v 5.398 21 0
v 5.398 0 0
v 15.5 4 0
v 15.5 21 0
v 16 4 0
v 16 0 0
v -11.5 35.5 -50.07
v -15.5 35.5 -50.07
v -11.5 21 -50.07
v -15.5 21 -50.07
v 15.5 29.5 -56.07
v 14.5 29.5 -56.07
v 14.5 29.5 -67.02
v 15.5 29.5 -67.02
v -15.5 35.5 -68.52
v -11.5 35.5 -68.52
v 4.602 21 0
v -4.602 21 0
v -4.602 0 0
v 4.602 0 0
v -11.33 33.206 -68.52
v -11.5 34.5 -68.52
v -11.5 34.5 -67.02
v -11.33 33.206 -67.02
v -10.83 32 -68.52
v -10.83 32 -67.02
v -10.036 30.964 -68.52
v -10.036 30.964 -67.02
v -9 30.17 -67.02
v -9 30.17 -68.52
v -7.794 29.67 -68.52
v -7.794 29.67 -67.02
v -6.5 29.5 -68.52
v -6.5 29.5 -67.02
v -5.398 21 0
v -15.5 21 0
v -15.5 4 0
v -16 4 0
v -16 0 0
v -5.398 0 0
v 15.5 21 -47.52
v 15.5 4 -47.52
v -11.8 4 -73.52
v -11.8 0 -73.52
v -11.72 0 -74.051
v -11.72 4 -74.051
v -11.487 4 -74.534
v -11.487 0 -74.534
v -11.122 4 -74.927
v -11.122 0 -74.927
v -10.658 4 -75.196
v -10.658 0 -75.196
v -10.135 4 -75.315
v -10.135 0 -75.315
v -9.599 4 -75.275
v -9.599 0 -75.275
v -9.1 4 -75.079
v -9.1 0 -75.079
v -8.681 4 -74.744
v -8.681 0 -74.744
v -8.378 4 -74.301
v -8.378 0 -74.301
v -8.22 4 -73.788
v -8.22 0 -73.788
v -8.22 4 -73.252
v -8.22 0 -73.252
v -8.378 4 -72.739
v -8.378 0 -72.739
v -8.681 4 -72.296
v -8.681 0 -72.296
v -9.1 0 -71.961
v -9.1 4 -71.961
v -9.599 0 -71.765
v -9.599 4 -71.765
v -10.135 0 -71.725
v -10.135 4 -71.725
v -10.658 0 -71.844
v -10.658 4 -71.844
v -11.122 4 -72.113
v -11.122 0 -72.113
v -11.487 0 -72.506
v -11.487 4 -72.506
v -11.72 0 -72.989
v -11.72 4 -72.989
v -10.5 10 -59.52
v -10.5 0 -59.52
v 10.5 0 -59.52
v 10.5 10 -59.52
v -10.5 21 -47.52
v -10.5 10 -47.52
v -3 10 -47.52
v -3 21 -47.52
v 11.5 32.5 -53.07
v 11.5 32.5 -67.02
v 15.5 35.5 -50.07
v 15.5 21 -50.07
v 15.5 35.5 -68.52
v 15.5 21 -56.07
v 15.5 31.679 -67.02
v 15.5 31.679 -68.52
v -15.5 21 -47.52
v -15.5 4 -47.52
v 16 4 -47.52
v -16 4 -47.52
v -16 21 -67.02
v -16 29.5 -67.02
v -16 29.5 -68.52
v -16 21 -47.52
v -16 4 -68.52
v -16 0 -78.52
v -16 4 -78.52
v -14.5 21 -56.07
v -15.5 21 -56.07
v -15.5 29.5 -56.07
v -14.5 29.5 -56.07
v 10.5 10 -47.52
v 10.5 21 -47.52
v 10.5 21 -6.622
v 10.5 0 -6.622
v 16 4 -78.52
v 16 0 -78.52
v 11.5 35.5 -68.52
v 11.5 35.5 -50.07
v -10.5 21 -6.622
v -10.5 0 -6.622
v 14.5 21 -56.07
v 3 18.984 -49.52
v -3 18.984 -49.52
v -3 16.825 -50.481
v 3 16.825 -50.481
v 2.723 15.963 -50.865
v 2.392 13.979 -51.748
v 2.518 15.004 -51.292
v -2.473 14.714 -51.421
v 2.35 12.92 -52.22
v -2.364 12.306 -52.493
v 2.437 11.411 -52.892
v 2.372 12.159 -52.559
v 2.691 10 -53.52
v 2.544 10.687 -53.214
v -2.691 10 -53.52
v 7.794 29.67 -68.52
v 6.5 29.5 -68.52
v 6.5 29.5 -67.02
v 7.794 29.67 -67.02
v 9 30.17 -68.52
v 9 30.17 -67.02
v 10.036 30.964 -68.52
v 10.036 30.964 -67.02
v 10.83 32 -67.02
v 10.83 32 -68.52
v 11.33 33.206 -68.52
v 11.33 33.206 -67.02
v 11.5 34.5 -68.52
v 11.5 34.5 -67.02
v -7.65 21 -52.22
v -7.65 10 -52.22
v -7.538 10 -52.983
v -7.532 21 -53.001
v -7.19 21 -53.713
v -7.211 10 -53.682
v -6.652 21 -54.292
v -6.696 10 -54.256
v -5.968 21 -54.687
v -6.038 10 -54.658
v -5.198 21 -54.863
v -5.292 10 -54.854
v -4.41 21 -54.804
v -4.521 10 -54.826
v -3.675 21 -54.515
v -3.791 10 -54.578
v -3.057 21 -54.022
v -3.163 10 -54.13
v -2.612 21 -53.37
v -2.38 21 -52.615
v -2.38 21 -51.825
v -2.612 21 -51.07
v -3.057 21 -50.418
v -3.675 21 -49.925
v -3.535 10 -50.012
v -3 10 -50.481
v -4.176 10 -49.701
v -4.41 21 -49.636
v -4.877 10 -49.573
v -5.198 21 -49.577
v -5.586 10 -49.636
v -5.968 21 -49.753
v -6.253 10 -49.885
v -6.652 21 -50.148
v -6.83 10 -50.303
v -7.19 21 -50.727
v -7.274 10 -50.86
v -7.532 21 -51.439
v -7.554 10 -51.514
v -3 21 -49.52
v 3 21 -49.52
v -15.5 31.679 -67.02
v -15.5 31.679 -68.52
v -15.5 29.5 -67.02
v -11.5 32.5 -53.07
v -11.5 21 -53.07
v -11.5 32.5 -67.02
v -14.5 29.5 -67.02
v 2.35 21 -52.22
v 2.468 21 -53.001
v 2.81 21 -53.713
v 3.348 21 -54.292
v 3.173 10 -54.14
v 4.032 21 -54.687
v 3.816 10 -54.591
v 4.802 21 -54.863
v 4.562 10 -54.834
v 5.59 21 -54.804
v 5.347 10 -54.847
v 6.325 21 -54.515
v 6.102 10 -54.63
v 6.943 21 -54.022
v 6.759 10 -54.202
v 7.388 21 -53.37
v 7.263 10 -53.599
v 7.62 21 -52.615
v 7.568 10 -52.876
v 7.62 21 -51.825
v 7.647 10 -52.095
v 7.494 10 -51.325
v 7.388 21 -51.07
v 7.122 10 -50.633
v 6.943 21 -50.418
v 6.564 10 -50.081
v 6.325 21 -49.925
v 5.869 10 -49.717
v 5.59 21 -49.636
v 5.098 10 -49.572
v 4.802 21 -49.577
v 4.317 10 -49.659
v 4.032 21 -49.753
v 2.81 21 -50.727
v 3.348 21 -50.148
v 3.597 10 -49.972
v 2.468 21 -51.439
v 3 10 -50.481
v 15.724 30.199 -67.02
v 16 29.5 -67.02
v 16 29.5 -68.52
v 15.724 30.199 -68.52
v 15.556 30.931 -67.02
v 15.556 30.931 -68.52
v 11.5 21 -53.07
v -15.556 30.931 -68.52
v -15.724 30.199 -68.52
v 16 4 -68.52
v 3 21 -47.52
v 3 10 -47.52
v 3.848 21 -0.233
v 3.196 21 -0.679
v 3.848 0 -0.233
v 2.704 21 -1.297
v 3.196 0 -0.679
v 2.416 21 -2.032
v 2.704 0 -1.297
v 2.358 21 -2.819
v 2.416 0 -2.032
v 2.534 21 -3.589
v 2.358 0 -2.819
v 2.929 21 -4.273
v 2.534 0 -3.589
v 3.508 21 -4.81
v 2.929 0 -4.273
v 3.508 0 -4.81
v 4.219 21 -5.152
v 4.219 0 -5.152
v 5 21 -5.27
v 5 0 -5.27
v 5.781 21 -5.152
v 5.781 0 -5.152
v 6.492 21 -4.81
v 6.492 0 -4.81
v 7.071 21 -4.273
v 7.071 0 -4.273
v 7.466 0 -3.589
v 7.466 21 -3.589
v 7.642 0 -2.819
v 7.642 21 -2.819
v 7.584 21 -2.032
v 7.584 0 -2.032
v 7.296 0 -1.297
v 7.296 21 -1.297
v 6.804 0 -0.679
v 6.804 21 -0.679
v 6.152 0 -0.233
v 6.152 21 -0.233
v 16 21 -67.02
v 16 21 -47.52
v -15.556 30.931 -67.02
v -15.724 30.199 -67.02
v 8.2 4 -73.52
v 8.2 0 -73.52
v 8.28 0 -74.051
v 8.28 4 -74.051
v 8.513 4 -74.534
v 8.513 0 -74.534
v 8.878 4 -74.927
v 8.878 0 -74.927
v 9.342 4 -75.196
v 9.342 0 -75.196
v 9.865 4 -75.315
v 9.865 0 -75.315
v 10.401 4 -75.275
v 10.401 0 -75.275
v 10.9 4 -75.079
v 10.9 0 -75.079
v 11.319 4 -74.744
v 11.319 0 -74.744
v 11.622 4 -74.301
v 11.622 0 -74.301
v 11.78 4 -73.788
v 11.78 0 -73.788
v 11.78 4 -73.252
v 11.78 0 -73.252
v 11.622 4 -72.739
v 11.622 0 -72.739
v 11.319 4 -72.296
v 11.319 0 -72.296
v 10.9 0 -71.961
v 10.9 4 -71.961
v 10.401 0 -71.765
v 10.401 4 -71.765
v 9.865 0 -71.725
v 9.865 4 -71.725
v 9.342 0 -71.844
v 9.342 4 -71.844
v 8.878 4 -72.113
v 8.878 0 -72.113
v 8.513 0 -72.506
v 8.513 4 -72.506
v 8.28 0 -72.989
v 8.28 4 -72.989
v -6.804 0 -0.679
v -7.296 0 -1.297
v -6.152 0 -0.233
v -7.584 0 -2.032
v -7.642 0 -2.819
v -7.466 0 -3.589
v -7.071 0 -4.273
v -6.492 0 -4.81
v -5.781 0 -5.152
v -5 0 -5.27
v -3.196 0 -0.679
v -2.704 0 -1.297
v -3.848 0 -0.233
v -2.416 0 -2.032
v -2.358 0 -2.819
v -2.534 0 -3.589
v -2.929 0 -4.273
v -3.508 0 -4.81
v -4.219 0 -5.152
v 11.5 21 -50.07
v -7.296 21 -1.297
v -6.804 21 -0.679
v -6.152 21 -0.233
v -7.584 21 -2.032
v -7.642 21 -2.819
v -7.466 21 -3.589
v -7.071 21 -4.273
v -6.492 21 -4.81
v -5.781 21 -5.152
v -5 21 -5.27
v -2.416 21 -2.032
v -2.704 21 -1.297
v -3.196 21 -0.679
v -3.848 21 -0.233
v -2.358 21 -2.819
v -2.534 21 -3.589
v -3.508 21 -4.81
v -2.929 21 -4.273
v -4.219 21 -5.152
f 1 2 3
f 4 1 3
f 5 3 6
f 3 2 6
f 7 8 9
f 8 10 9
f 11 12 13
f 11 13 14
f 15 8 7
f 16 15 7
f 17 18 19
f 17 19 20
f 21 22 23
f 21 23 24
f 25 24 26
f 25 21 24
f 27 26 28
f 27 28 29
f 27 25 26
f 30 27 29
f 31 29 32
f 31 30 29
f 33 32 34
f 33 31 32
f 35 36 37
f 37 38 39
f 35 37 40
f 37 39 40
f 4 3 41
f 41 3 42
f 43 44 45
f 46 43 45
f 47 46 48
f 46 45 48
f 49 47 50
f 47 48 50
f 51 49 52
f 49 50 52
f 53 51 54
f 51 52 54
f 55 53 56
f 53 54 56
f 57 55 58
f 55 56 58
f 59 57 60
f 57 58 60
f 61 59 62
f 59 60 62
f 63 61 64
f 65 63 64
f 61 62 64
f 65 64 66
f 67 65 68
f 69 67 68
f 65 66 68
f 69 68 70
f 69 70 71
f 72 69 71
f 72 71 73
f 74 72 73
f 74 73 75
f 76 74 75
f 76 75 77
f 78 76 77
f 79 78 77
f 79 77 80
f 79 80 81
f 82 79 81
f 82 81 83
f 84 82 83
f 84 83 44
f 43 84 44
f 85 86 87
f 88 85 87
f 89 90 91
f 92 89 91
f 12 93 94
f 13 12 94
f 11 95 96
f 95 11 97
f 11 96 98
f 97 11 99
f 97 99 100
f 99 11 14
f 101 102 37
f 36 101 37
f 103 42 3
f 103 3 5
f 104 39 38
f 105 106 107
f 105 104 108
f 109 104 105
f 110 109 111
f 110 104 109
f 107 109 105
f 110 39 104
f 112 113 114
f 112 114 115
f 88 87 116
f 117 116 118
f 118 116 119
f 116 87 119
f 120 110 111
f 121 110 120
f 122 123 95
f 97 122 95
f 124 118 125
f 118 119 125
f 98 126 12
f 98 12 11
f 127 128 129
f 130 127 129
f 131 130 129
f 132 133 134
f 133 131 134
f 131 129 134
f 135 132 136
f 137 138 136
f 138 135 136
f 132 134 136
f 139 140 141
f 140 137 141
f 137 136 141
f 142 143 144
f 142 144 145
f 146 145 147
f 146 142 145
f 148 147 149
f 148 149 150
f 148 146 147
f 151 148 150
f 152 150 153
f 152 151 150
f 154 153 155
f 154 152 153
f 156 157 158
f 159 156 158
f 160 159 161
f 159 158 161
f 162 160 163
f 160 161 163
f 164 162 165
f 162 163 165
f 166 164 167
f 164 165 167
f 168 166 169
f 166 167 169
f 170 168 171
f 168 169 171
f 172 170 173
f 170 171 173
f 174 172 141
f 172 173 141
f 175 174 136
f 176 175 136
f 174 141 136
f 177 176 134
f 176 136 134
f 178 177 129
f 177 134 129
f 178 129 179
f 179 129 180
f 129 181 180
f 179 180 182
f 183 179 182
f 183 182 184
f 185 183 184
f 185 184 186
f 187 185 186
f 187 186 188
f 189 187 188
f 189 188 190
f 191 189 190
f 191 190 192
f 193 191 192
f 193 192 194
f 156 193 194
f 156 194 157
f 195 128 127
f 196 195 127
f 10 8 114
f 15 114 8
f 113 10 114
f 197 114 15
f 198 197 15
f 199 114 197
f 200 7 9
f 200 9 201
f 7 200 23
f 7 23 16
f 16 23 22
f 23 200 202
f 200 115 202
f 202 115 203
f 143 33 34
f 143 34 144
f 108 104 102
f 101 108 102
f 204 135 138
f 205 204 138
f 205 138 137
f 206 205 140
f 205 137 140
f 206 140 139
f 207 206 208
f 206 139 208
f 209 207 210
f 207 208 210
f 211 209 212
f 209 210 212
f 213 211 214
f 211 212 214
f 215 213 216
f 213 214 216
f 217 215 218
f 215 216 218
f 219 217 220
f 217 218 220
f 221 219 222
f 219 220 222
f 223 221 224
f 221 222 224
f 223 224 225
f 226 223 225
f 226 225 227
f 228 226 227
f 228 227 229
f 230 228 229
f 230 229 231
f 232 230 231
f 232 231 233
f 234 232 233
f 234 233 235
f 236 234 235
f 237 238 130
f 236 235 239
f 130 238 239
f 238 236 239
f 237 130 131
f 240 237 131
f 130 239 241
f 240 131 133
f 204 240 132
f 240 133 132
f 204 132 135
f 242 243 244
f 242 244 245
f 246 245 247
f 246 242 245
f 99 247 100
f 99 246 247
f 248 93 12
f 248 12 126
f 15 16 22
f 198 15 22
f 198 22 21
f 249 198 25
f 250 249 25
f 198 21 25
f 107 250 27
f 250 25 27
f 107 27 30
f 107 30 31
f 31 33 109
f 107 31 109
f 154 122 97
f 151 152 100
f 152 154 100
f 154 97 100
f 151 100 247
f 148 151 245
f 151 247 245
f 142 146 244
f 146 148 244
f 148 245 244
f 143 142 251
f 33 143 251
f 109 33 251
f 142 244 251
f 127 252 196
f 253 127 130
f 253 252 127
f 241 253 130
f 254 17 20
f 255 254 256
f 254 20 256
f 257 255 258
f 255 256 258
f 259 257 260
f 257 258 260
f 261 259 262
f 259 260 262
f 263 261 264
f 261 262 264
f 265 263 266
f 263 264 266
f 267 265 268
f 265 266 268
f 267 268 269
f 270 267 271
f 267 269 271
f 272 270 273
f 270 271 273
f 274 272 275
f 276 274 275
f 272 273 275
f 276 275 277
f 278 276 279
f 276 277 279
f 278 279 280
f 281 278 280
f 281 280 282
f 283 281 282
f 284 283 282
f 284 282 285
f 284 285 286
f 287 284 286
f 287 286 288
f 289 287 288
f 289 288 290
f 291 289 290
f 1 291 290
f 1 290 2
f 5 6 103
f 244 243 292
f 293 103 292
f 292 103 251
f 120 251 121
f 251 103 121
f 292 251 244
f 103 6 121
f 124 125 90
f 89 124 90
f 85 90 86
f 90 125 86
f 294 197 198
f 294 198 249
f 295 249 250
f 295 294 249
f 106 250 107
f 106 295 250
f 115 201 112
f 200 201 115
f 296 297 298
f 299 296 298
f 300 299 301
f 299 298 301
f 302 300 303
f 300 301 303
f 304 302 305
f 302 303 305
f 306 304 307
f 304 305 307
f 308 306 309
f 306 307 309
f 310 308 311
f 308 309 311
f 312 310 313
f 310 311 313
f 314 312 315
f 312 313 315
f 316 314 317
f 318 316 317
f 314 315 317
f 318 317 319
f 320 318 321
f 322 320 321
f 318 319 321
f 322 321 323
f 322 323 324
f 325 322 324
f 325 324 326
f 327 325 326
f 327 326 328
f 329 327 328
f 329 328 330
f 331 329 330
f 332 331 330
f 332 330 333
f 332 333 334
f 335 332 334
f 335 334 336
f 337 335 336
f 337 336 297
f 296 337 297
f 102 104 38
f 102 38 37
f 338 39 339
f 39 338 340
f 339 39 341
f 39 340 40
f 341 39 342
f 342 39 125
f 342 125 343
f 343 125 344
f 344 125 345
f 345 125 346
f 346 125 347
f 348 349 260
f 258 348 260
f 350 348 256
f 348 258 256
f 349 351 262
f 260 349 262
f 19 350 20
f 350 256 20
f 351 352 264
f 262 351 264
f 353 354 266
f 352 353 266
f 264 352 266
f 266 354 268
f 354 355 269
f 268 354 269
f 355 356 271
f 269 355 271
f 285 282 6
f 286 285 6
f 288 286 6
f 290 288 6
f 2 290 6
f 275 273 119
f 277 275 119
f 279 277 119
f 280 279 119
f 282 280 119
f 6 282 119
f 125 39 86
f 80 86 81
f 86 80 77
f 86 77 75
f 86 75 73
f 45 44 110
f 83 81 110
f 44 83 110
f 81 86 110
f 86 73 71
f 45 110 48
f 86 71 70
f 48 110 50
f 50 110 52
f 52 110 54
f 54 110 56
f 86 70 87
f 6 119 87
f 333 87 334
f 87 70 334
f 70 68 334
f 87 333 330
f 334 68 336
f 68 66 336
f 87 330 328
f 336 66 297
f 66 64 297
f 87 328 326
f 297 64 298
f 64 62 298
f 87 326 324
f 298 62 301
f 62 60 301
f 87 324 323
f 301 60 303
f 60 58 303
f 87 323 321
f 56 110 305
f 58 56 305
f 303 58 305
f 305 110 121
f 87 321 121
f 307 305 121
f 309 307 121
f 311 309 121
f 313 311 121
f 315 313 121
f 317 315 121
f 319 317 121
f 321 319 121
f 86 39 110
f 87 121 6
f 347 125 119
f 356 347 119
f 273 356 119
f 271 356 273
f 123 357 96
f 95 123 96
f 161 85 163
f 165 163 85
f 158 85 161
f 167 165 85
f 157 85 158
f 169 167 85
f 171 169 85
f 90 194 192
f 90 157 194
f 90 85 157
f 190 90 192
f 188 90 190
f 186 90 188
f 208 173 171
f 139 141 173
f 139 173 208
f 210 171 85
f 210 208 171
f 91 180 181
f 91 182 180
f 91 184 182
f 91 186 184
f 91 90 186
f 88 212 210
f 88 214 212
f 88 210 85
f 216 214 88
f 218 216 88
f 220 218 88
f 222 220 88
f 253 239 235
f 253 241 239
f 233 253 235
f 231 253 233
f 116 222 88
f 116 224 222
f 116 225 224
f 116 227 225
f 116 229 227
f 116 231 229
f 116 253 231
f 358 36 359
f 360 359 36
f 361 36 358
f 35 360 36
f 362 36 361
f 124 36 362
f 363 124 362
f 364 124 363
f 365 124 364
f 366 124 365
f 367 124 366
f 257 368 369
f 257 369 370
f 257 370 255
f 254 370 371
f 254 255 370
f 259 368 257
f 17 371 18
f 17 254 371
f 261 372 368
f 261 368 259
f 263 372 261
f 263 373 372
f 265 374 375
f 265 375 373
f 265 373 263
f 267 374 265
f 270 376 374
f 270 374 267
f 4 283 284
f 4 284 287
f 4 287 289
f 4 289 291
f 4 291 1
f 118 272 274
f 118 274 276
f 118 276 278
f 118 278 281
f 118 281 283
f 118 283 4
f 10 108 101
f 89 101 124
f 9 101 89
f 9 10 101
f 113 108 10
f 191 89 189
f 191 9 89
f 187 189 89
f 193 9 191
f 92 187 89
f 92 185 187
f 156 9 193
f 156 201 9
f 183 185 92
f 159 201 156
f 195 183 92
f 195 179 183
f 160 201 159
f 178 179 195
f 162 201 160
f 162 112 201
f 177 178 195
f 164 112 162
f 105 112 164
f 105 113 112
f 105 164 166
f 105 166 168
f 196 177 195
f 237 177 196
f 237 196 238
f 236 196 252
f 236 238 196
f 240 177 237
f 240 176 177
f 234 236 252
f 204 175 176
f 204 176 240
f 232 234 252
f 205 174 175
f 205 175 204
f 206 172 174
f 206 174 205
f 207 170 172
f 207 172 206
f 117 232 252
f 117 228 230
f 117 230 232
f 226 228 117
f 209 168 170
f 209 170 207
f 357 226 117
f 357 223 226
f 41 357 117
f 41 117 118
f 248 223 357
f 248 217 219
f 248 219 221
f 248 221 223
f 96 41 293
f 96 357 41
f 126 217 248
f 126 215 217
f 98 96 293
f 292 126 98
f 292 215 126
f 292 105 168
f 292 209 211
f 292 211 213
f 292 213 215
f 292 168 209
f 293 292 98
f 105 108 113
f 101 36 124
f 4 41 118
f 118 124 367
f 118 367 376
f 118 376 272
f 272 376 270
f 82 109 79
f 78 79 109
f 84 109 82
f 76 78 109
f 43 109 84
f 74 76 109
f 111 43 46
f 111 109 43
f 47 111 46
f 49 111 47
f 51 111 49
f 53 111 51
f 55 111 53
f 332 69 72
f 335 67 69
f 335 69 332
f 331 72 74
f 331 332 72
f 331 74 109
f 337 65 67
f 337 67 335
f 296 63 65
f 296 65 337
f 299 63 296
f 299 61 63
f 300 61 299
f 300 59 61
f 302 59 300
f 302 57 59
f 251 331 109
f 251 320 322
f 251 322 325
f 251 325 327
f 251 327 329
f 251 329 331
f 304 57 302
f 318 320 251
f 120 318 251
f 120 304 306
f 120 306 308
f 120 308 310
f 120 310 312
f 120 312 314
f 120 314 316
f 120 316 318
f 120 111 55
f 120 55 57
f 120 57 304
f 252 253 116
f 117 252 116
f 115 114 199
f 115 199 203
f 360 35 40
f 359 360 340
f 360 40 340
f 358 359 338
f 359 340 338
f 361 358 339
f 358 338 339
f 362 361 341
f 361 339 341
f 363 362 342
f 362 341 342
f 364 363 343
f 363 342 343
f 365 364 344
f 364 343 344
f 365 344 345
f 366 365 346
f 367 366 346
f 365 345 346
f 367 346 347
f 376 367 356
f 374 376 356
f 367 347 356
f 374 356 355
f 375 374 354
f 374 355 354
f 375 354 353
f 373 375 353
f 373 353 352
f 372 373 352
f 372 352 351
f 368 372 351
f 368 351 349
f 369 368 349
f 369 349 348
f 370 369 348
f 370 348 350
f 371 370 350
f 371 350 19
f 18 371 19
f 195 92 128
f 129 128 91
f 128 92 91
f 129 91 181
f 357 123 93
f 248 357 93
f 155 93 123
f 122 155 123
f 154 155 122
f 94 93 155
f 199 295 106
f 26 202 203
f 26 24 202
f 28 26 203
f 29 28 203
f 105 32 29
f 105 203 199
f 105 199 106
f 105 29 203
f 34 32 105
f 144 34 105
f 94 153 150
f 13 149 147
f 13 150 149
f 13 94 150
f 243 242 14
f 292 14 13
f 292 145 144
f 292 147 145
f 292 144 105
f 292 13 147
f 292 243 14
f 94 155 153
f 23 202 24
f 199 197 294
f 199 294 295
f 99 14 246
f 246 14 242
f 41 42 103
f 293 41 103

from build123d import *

# Parameters (mm, degrees)
SKETCH1_W                  = 32
SKETCH1_H                  = 78.52
BOSS_EXTRUDE1_DEPTH        = 4
M3_CLEARANCE_HOLE1_D       = 3.6
M3_CLEARANCE_HOLE1_DEPTH   = 10
M3_CLEARANCE_HOLE1_TIP     = 1.081549114
BOSS_EXTRUDE2_DEPTH        = 17
BOSS_EXTRUDE3_DEPTH        = 17
SKETCH6_W                  = 32
SKETCH6_H                  = 1.5
SKETCH6_W_2                = 4
SKETCH6_H_2                = 6
BOSS_EXTRUDE4_DEPTH        = 8.5
SKETCH14_W                 = 4
SKETCH14_H                 = 18.45
BOSS_EXTRUDE5_DEPTH        = 6
FILLET1_R                  = 5
CHAMFER1_SIZE              = 3
CHAMFER2_SIZE              = 3
CUT_EXTRUDE1_DEPTH         = 87.102499383
CUT_EXTRUDE1_DEPTH_BACK    = 87.102499383
SKETCH15_W                 = 21
SKETCH15_H                 = 40.897809358
F_5_3_5_3_DIAMETER_HOLE1_D = 5.3
SKETCH19_W                 = 21
SKETCH19_H                 = 12
CUT_EXTRUDE2_DEPTH         = 10
CUT_EXTRUDE3_DEPTH         = 83.839546112
CUT_EXTRUDE3_DEPTH_BACK    = 83.839546112
SKETCH20_W                 = 6
SKETCH20_H                 = 2
CHAMFER3_SIZE              = 8.984147096
CHAMFER3_SIZE_2            = 4


with BuildPart() as part:
    # Sketch1 → Boss-Extrude1 (new body)
    with BuildSketch(Plane(origin=(0, 0, 0), x_dir=(1, 0, 0), z_dir=(0, 1, 0))):
        with Locations((0, 39.26)):
            Rectangle(SKETCH1_W, SKETCH1_H)
    extrude(amount=BOSS_EXTRUDE1_DEPTH)

    # M3 Clearance Hole1
    with Locations(Plane(origin=(0, 4, 0), x_dir=(1, 0, 0), z_dir=(0, 1, 0))):
        with Locations((-10, 73.52), (10, 73.52)):
            Hole(M3_CLEARANCE_HOLE1_D / 2, depth=M3_CLEARANCE_HOLE1_DEPTH)
            with Locations((0, 0, -(M3_CLEARANCE_HOLE1_DEPTH + M3_CLEARANCE_HOLE1_TIP / 2))):  # 118° drill point
                Cone(0, M3_CLEARANCE_HOLE1_D / 2, M3_CLEARANCE_HOLE1_TIP, mode=Mode.SUBTRACT)

    # Sketch5 → Boss-Extrude2 (add)
    with BuildSketch(Plane(origin=(0, 4, 0), x_dir=(1, 0, 0), z_dir=(0, 1, 0))):
        Polygon((16, 68.52), (-16, 68.52), (-16, 47.520000358), (-15.5, 47.520000358), (-10.5, 47.520000358), (10.5, 47.520000358), (15.5, 47.520000358), (16, 47.520000358), align=None)
    extrude(amount=BOSS_EXTRUDE2_DEPTH)

    # Sketch5<4> → Boss-Extrude3 (add)
    with BuildSketch(Plane(origin=(0, 4, 0), x_dir=(1, 0, 0), z_dir=(0, 1, 0))):
        Polygon((-10.5, 47.520000358), (-15.5, 47.520000358), (-15.5, 0), (15.5, 0), (15.5, 47.520000358), (10.5, 47.520000358), (10.5, 6.622191), (-10.5, 6.622191), align=None)
    extrude(amount=BOSS_EXTRUDE3_DEPTH)

    # Sketch6 → Boss-Extrude4 (add)
    with BuildSketch(Plane(origin=(0, 21, 0), x_dir=(1, 0, 0), z_dir=(0, 1, 0))):
        with Locations((0, 67.77)):
            Rectangle(SKETCH6_W, SKETCH6_H)
        with Locations((13.5, 53.07)):
            Rectangle(SKETCH6_W_2, SKETCH6_H_2)
        with Locations((-13.5, 53.07)):
            Rectangle(SKETCH6_W_2, SKETCH6_H_2)
    extrude(amount=BOSS_EXTRUDE4_DEPTH)

    # Sketch14 → Boss-Extrude5 (add)
    with BuildSketch(Plane(origin=(0, 29.5, 0), x_dir=(1, 0, 0), z_dir=(0, 1, 0))):
        with Locations((-13.5, 59.295)):
            Rectangle(SKETCH14_W, SKETCH14_H)
        with Locations((13.5, 59.295)):
            Rectangle(SKETCH14_W, SKETCH14_H)
    extrude(amount=BOSS_EXTRUDE5_DEPTH)

    # Fillet1
    # the kernel refuses this fillet: 5 mm, written as the material it adds along each edge
    with BuildSketch(Plane(origin=(-11.5, 29.5, -68.52), x_dir=(0, 1, 0), z_dir=(0, 0, 1)), Plane(origin=(11.5, 29.5, -68.52), x_dir=(-1, 0, 0), z_dir=(0, 0, 1))) as fillet1_piece_1:
        with BuildLine():
            CenterArc((FILLET1_R, -FILLET1_R), FILLET1_R, 90, 90)
            Line((0, -FILLET1_R), (0, 0))
            Line((0, 0), (FILLET1_R, 0))
        make_face()
    extrude(amount=1.5)
    with BuildSketch(Plane(origin=(-15.5, 29.5, -67.02), x_dir=(-1, 0, 0), z_dir=(0, 0, -1))) as fillet1_piece_2:
        with BuildLine():
            CenterArc((5, 2.179449472), FILLET1_R, 180, 25.841932763)
            Line((0, 2.179449472), (0, 0))
            Line((0, 0), (0.5, 0))
        make_face()
    extrude(amount=1.5)
    with BuildSketch(Plane(origin=(15.5, 29.5, -67.02), x_dir=(0, 1, 0), z_dir=(0, 0, -1))) as fillet1_piece_3:
        with BuildLine():
            CenterArc((2.179449472, 5), FILLET1_R, 244.158067237, 25.841932763)
            Line((0, 0.5), (0, 0))
            Line((0, 0), (2.179449472, 0))
        make_face()
    extrude(amount=1.5)

    # Chamfer1
    chamfer1_edges = [part.edges().sort_by_distance(p)[0] for p in [
        (-11.5, 29.5, -61.545),
        (11.5, 29.5, -61.545),
    ]]
    chamfer(chamfer1_edges, length=CHAMFER1_SIZE)

    # Chamfer2
    chamfer2_edges = [part.edges().sort_by_distance(p)[0] for p in [
        (11.5, 26.75, -56.07),
        (-11.5, 26.75, -56.07),
    ]]
    chamfer(chamfer2_edges, length=CHAMFER2_SIZE)

    # Sketch15 → Cut-Extrude1 (cut, two sides: drawn at the far end of the back side and taken through both)
    with BuildSketch(Plane(origin=(0, 4, 0), x_dir=(1, 0, 0), z_dir=(0, 1, 0)).offset(-CUT_EXTRUDE1_DEPTH_BACK)):
        with Locations((0, 27.071095679)):
            Rectangle(SKETCH15_W, SKETCH15_H)
    extrude(amount=CUT_EXTRUDE1_DEPTH + CUT_EXTRUDE1_DEPTH_BACK, mode=Mode.SUBTRACT)

    # Ø5.3 (5.3) Diameter Hole1 (through all)
    with Locations(Plane(origin=(0, 21, 0), x_dir=(1, 0, 0), z_dir=(0, 1, 0))):
        with Locations((-5, 52.220000358), (5, 52.220000358), (-5, 2.62), (5, 2.62)):
            Hole(F_5_3_5_3_DIAMETER_HOLE1_D / 2)

    # Sketch19 → Cut-Extrude2 (cut)
    with BuildSketch(Plane.XZ):
        with Locations((0, -53.520000358)):
            Rectangle(SKETCH19_W, SKETCH19_H)
    extrude(amount=-CUT_EXTRUDE2_DEPTH, mode=Mode.SUBTRACT)

    # Sketch20 → Cut-Extrude3 (cut, two sides: drawn at the far end of the back side and taken through both)
    with BuildSketch(Plane(origin=(0, 21, 0), x_dir=(1, 0, 0), z_dir=(0, 1, 0)).offset(-CUT_EXTRUDE3_DEPTH_BACK)):
        with Locations((0, 48.520000358)):
            Rectangle(SKETCH20_W, SKETCH20_H)
    extrude(amount=CUT_EXTRUDE3_DEPTH + CUT_EXTRUDE3_DEPTH_BACK, mode=Mode.SUBTRACT)

    # Chamfer3
    # the kernel refuses this chamfer: 8.984147096, 4 mm, written as the material it takes off along each edge
    with BuildSketch(Plane(origin=(-3, 10, -49.520000358), x_dir=(0, 0.9998768419809391, 0.015693975602887315), z_dir=(1, 0, 0))) as chamfer3_piece_1:
        Polygon((CHAMFER3_SIZE * 0.999876841938, -CHAMFER3_SIZE * 0.0156939756022), (-CHAMFER3_SIZE_2 * 0.0156939756029, -CHAMFER3_SIZE_2 * 0.999876841981), (0, 0), align=None)
    extrude(amount=6, mode=Mode.SUBTRACT)


solid = part.part
